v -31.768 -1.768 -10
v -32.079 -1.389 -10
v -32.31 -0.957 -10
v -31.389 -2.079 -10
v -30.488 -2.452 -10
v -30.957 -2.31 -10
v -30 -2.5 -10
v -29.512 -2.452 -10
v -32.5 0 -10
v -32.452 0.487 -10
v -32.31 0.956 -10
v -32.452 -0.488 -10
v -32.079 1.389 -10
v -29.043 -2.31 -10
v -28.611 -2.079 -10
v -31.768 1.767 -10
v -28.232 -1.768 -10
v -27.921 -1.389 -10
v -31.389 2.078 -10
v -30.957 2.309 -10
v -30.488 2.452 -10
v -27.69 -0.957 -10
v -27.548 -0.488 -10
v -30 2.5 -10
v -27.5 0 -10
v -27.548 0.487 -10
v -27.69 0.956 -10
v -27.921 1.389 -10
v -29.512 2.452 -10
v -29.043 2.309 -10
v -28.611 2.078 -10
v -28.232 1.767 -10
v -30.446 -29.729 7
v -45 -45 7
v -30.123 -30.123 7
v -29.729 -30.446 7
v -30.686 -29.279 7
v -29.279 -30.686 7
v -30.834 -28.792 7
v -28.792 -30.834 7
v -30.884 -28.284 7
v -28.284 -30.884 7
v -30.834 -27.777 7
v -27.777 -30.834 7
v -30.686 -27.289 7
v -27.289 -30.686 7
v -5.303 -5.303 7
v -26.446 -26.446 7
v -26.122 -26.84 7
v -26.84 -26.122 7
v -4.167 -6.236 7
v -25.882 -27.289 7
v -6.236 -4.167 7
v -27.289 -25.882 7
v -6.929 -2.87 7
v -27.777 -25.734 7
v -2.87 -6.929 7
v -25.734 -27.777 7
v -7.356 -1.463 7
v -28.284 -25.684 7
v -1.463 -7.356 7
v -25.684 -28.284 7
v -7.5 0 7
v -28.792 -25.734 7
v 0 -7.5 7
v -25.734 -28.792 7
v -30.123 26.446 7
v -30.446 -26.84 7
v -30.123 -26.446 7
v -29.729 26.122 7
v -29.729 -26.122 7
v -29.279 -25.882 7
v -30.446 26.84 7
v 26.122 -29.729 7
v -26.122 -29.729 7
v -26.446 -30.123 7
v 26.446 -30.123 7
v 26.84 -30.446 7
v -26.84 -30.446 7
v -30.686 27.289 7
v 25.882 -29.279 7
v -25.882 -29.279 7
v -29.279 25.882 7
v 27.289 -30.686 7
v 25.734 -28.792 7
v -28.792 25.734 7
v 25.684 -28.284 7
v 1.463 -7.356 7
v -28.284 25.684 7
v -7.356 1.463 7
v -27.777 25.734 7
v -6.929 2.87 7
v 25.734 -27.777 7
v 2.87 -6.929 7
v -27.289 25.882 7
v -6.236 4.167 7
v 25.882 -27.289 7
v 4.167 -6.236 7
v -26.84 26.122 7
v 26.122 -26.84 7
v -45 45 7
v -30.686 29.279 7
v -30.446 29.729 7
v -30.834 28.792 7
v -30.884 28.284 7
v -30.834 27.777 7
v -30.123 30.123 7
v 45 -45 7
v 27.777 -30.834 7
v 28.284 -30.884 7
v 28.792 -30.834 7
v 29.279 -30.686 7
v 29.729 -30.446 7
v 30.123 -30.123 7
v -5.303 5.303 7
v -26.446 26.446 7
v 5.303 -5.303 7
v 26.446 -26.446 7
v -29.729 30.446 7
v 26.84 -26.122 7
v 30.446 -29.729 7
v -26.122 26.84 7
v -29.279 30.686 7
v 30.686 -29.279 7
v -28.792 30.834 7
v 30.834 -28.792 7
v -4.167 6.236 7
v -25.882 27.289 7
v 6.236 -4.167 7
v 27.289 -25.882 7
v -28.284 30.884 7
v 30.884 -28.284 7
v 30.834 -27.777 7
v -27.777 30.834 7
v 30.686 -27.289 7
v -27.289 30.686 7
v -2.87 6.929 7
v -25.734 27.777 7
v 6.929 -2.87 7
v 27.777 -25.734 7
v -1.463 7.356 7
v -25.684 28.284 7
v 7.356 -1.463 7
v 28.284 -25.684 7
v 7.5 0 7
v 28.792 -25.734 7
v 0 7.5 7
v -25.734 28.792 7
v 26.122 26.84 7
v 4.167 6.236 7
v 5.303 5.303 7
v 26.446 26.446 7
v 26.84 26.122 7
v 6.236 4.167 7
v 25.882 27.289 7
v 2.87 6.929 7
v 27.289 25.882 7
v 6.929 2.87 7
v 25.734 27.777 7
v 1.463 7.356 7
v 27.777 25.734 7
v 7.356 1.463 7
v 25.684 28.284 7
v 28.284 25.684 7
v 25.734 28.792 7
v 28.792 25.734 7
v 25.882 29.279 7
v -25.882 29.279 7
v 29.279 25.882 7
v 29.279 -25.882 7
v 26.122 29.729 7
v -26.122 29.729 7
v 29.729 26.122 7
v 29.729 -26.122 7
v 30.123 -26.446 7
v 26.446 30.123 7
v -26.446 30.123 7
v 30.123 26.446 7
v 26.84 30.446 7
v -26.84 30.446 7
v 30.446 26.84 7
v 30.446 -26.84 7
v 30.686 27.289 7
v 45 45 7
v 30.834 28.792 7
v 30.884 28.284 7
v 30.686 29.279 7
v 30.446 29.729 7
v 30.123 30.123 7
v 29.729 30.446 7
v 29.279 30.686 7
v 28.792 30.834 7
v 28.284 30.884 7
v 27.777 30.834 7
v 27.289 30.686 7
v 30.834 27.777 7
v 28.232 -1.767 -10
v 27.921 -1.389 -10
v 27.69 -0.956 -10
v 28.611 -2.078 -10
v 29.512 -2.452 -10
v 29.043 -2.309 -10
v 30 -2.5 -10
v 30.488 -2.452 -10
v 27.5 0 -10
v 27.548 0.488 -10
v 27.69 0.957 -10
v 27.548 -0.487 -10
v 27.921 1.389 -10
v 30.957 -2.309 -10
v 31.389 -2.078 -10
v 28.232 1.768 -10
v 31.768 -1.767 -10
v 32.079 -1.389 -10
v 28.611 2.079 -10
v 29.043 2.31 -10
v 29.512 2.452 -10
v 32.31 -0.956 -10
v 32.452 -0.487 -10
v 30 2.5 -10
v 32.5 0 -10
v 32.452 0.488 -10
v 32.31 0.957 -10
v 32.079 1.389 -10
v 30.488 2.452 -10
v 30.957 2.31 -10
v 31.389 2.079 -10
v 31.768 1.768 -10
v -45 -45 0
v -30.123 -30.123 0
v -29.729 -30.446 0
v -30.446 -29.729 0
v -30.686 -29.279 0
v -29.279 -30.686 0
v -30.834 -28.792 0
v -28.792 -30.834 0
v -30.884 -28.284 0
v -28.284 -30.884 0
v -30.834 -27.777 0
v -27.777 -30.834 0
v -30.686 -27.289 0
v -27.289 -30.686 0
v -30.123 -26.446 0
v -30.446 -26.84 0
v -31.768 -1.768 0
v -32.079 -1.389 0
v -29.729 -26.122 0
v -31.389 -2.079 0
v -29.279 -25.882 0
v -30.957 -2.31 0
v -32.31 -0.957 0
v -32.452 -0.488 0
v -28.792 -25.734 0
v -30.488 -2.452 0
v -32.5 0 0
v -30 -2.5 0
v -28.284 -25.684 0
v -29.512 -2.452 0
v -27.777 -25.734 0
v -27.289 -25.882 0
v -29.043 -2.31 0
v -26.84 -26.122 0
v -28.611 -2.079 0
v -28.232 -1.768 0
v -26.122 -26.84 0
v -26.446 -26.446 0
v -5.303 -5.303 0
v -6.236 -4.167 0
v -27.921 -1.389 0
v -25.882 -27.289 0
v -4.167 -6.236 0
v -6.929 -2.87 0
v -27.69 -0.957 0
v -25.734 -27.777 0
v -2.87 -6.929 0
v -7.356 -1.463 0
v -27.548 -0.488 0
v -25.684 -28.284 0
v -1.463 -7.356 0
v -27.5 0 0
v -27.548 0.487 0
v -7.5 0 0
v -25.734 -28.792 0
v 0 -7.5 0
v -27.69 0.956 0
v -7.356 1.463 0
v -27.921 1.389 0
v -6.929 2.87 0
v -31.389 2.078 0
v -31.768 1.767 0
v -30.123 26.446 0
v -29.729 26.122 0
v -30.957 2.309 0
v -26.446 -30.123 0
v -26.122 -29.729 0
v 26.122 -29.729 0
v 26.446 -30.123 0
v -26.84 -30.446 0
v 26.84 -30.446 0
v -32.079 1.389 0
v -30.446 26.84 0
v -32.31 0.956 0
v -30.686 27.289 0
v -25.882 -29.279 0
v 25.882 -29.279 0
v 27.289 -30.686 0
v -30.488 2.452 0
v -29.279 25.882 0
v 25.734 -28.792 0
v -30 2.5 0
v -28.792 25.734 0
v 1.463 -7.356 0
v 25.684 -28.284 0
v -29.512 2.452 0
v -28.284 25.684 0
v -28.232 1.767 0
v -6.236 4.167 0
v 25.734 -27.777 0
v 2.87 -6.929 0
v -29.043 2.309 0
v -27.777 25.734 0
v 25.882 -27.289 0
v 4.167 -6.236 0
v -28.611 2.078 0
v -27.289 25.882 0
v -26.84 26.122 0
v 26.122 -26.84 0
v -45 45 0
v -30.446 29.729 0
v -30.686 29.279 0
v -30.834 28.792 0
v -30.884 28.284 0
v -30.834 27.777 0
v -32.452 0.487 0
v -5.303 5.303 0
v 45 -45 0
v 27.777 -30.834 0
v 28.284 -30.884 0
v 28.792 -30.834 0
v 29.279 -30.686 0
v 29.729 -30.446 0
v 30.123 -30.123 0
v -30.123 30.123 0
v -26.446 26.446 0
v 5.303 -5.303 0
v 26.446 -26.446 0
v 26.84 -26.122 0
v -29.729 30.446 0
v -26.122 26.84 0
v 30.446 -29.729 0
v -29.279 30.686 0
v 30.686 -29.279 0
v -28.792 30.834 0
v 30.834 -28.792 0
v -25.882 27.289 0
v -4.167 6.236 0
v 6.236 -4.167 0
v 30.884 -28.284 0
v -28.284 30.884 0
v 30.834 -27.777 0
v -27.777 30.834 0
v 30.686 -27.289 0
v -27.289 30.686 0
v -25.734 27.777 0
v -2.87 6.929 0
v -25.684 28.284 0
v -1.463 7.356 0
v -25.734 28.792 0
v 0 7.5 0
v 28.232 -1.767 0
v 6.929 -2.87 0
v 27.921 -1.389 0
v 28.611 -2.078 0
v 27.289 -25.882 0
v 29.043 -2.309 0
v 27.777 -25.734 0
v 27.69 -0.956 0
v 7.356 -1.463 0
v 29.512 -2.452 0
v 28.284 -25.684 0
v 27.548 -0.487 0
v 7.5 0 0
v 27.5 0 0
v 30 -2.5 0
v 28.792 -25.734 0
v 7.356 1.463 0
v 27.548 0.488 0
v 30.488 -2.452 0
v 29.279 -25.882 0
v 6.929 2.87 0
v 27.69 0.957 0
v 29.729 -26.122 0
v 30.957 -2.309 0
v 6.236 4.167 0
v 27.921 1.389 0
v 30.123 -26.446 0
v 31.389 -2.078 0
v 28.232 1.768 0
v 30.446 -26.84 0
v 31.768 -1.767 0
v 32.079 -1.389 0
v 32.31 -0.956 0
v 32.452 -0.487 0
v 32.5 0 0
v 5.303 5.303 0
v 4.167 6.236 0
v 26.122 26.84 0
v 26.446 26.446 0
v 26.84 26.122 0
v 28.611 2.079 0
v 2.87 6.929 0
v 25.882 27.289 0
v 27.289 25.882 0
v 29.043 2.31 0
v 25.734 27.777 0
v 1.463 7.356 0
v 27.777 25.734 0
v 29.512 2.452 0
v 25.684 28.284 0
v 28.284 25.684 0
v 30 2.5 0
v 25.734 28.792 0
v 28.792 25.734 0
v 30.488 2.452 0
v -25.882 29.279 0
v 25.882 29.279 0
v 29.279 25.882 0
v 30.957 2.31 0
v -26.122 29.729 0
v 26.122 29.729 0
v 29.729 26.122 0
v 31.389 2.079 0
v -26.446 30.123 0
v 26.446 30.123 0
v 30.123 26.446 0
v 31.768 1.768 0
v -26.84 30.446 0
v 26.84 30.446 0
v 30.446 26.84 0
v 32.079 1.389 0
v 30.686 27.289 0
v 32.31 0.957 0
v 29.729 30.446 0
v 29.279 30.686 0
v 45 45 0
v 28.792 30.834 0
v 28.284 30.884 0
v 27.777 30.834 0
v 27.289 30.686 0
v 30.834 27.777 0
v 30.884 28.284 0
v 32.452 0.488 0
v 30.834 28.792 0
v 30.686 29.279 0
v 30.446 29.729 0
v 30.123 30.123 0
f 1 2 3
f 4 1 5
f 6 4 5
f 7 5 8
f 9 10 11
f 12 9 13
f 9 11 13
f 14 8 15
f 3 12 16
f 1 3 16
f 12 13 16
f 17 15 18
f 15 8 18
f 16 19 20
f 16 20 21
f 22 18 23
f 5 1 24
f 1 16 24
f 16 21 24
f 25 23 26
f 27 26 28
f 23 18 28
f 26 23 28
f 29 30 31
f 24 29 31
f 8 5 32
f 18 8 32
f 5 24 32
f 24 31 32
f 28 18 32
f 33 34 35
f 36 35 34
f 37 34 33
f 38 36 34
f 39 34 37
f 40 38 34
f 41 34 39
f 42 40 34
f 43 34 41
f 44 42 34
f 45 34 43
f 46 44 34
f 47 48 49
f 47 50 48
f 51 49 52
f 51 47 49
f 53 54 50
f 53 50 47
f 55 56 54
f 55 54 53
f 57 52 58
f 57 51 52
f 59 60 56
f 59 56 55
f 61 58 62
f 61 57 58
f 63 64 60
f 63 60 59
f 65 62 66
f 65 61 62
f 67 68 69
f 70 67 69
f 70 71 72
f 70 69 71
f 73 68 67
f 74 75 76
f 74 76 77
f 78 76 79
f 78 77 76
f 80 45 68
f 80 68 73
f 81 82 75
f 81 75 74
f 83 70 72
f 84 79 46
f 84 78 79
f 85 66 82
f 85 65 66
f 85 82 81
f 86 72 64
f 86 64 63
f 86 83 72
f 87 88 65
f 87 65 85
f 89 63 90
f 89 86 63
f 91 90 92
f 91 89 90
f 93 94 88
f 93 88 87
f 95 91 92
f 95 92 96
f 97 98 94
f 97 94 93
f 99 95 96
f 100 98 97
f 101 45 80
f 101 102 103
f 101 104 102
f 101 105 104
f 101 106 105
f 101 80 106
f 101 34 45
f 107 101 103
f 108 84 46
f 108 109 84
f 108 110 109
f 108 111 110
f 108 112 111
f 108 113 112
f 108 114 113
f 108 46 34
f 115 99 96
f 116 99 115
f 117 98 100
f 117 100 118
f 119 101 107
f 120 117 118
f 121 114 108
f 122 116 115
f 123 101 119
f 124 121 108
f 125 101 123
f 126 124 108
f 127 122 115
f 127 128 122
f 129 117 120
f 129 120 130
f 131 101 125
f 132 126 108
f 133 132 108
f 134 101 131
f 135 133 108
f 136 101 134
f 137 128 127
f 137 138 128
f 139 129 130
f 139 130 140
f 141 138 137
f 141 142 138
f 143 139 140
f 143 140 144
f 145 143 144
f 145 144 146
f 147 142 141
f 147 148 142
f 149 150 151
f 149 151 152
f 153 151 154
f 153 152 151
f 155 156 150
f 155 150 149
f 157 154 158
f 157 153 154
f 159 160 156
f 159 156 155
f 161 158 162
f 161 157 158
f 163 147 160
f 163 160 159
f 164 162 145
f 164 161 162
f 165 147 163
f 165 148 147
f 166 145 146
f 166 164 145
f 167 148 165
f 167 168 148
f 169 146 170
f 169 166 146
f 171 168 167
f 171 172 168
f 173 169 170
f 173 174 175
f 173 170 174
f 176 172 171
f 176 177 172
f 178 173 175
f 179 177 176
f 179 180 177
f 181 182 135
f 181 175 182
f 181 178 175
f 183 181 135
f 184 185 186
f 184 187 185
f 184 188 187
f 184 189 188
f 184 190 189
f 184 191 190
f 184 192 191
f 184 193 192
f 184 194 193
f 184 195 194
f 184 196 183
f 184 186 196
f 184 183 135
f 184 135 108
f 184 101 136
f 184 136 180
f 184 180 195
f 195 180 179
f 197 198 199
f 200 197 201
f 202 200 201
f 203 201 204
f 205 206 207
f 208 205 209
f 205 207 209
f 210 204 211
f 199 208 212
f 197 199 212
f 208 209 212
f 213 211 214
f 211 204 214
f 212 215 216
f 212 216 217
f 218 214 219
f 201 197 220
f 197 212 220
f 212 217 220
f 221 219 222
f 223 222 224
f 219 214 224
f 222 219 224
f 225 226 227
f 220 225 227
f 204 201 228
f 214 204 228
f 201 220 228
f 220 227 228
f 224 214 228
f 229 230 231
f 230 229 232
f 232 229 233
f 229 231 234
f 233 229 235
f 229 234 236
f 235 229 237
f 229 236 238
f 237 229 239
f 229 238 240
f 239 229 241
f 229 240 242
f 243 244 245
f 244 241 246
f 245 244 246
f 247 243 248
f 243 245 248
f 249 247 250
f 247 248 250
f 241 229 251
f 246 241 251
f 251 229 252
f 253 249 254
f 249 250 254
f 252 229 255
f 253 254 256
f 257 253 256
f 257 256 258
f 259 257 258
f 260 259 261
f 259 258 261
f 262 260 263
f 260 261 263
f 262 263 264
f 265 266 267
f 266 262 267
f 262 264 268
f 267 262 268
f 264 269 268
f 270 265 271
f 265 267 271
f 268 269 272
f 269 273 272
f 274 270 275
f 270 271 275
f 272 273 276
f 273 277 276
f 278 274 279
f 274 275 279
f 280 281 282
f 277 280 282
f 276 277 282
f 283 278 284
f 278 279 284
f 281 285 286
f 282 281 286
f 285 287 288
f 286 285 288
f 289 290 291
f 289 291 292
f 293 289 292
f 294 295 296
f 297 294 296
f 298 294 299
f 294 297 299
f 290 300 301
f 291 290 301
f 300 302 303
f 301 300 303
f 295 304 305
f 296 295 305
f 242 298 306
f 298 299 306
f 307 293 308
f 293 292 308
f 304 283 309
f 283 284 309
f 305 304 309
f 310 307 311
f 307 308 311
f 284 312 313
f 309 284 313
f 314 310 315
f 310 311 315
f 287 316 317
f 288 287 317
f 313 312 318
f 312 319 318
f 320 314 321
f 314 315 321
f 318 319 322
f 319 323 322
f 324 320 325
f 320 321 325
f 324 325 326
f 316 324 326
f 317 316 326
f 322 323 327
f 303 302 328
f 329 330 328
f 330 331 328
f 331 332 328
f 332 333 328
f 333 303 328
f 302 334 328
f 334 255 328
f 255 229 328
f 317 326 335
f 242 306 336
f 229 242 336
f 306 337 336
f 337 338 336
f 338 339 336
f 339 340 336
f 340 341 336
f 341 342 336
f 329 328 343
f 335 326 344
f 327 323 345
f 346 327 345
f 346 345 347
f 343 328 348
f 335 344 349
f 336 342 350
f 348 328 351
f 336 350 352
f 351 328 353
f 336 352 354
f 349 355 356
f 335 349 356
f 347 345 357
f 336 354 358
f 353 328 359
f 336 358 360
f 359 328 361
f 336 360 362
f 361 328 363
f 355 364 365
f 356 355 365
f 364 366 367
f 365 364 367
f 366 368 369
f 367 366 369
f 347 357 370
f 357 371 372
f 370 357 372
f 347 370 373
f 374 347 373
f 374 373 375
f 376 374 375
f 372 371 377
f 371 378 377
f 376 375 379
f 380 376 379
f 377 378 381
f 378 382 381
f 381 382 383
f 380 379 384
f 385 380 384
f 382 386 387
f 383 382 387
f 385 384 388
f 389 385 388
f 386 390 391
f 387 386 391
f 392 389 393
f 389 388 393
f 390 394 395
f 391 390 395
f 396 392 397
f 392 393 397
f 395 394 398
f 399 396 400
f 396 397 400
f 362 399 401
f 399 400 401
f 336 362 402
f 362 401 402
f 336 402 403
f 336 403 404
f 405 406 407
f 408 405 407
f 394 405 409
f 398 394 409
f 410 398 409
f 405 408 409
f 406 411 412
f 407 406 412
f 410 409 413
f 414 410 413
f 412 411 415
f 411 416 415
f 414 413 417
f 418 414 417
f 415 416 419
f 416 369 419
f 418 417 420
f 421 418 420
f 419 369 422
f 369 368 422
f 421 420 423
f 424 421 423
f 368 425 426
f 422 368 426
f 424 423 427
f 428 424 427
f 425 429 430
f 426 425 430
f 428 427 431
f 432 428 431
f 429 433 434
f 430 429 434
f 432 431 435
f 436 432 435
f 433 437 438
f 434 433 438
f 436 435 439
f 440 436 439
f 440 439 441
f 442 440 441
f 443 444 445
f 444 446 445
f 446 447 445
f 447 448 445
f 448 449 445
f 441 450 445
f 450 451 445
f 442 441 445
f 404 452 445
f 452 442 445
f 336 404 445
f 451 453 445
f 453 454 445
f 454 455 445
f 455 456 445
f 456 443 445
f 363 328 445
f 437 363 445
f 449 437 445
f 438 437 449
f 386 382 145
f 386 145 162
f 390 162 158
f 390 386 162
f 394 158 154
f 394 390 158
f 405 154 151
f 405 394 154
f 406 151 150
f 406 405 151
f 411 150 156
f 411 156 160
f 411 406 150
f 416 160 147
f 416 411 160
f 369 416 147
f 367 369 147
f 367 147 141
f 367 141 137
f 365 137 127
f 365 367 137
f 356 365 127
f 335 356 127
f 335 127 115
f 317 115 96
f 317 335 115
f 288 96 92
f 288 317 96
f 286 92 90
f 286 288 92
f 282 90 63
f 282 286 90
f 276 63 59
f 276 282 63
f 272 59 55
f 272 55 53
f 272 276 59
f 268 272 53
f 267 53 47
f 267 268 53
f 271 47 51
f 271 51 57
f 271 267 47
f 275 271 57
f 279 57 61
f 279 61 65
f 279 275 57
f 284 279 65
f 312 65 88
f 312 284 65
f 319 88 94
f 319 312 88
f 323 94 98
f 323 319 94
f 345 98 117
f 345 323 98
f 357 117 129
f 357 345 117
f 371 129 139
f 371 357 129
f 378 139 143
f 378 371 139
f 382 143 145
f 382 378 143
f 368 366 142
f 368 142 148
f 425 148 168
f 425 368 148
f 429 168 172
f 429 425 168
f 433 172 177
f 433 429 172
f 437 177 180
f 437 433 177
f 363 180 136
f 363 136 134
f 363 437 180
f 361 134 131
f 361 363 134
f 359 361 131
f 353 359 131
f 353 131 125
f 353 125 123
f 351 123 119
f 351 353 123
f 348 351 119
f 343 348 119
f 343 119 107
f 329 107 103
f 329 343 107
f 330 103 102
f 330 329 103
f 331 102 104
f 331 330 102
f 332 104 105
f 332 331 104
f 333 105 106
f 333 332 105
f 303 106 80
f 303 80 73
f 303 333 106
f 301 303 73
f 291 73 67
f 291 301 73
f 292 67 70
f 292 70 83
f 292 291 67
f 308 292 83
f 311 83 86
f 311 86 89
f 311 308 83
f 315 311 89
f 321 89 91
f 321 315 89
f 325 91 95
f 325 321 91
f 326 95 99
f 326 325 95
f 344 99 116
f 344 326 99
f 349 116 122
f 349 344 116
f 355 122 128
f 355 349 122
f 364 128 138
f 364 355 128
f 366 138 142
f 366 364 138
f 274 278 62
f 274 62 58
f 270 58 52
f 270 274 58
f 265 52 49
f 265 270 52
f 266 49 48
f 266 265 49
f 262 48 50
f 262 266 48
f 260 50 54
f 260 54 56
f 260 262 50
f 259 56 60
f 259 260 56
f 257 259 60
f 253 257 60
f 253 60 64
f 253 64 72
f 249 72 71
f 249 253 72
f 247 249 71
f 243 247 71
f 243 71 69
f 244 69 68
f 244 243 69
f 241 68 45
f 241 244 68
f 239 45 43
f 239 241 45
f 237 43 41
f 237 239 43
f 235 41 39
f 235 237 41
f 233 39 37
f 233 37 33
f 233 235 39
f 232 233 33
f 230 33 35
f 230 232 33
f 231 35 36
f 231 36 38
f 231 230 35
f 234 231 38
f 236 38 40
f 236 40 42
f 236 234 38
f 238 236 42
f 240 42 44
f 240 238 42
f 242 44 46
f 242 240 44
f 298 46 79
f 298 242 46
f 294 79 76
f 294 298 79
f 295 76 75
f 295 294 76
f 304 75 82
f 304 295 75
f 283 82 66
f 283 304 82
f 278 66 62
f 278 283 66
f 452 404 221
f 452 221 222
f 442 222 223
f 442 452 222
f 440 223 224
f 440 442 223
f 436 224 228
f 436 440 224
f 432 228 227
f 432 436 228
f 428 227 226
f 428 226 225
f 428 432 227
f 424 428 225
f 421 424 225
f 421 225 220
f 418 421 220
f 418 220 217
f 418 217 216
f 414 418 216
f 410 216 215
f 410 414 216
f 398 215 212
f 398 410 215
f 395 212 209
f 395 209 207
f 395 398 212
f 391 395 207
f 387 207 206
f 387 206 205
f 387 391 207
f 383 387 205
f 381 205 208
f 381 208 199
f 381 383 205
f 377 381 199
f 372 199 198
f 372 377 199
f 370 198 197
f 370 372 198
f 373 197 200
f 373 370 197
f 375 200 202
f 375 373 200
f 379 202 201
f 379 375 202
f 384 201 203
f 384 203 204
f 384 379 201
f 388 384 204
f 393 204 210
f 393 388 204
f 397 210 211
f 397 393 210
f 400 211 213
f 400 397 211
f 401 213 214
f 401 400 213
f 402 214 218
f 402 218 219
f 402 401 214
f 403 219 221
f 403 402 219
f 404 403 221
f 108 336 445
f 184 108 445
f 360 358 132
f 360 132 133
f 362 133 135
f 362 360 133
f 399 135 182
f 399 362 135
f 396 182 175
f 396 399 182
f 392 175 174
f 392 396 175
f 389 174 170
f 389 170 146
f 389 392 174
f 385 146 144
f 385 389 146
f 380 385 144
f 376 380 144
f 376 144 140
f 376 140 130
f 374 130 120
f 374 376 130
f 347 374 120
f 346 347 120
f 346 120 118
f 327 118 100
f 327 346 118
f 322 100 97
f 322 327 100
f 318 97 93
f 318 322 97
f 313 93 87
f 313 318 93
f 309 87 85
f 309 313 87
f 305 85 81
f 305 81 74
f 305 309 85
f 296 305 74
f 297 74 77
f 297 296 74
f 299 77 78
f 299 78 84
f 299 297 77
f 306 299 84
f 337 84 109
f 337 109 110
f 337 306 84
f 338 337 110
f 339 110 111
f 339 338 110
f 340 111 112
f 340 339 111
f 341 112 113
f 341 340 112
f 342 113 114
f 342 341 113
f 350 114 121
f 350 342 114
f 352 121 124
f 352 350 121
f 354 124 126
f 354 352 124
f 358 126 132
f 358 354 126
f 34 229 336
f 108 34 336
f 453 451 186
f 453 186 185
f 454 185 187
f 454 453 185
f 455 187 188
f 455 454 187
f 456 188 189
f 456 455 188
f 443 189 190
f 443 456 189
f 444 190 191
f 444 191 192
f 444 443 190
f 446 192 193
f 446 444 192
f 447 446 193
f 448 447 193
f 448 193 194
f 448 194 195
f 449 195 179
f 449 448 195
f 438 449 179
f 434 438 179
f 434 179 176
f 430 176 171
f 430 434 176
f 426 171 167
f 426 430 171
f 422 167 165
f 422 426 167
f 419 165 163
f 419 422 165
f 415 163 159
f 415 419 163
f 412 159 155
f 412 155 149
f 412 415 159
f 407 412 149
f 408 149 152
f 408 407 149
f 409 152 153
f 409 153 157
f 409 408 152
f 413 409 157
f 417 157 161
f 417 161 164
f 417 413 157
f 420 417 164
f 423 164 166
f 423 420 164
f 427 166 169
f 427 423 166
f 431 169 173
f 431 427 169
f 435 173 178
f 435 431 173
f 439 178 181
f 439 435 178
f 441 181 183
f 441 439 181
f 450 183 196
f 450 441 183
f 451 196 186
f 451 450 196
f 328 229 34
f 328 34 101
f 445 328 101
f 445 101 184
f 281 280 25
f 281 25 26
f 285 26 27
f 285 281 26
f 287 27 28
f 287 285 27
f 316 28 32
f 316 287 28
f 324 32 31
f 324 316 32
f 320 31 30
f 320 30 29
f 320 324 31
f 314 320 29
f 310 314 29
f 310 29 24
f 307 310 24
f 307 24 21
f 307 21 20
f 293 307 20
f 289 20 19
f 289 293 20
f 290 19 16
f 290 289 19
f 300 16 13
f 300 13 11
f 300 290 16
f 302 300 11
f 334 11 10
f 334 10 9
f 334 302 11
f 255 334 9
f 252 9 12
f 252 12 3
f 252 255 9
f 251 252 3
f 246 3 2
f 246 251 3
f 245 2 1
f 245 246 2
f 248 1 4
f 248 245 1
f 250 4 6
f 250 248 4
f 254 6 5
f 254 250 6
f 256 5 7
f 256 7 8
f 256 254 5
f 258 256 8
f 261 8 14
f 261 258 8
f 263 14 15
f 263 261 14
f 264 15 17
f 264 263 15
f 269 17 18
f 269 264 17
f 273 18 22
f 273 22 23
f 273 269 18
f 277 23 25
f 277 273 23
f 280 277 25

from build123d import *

# Parameters (mm, degrees)
F0_W     = 90
F0_H     = 90
F0_R     = 2.6
F0_R_2   = 2.5
F0_R_3   = 7.5
F1_DEPTH = 7
F2_DEPTH = 10


# Not quite as in the source:
# - a feature names something its author has since deleted; it is built from what else it names


with BuildPart() as f1:
    # F0 (on Top) → F1 (new body)
    with BuildSketch(Plane.XY):
        Rectangle(F0_W, F0_H)
        with Locations((-28.2842712475, -28.2842712475)):
            Circle(F0_R, mode=Mode.SUBTRACT)
        with Locations((-29.9999999986, -0.0002877)):
            Circle(F0_R_2, mode=Mode.SUBTRACT)
        with Locations((28.2842712475, -28.2842712475)):
            Circle(F0_R, mode=Mode.SUBTRACT)
        with Locations((-28.2842712475, 28.2842712475)):
            Circle(F0_R, mode=Mode.SUBTRACT)
        Circle(F0_R_3, mode=Mode.SUBTRACT)
        with Locations((29.9999999986, 0.0002877)):
            Circle(F0_R_2, mode=Mode.SUBTRACT)
        with Locations((28.2842712475, 28.2842712475)):
            Circle(F0_R, mode=Mode.SUBTRACT)
        with Locations((-29.9999999986, -0.0002877)):
            Circle(F0_R_2)
        with Locations((29.9999999986, 0.0002877)):
            Circle(F0_R_2)
    extrude(amount=F1_DEPTH)

    # F0 (on Top) → F2 (join)
    with BuildSketch(Plane.XY):
        with Locations((29.9999999986, 0.0002877)):
            Circle(F0_R_2)
        with Locations((-29.9999999986, -0.0002877)):
            Circle(F0_R_2)
    extrude(amount=-F2_DEPTH)


solid = f1.part
